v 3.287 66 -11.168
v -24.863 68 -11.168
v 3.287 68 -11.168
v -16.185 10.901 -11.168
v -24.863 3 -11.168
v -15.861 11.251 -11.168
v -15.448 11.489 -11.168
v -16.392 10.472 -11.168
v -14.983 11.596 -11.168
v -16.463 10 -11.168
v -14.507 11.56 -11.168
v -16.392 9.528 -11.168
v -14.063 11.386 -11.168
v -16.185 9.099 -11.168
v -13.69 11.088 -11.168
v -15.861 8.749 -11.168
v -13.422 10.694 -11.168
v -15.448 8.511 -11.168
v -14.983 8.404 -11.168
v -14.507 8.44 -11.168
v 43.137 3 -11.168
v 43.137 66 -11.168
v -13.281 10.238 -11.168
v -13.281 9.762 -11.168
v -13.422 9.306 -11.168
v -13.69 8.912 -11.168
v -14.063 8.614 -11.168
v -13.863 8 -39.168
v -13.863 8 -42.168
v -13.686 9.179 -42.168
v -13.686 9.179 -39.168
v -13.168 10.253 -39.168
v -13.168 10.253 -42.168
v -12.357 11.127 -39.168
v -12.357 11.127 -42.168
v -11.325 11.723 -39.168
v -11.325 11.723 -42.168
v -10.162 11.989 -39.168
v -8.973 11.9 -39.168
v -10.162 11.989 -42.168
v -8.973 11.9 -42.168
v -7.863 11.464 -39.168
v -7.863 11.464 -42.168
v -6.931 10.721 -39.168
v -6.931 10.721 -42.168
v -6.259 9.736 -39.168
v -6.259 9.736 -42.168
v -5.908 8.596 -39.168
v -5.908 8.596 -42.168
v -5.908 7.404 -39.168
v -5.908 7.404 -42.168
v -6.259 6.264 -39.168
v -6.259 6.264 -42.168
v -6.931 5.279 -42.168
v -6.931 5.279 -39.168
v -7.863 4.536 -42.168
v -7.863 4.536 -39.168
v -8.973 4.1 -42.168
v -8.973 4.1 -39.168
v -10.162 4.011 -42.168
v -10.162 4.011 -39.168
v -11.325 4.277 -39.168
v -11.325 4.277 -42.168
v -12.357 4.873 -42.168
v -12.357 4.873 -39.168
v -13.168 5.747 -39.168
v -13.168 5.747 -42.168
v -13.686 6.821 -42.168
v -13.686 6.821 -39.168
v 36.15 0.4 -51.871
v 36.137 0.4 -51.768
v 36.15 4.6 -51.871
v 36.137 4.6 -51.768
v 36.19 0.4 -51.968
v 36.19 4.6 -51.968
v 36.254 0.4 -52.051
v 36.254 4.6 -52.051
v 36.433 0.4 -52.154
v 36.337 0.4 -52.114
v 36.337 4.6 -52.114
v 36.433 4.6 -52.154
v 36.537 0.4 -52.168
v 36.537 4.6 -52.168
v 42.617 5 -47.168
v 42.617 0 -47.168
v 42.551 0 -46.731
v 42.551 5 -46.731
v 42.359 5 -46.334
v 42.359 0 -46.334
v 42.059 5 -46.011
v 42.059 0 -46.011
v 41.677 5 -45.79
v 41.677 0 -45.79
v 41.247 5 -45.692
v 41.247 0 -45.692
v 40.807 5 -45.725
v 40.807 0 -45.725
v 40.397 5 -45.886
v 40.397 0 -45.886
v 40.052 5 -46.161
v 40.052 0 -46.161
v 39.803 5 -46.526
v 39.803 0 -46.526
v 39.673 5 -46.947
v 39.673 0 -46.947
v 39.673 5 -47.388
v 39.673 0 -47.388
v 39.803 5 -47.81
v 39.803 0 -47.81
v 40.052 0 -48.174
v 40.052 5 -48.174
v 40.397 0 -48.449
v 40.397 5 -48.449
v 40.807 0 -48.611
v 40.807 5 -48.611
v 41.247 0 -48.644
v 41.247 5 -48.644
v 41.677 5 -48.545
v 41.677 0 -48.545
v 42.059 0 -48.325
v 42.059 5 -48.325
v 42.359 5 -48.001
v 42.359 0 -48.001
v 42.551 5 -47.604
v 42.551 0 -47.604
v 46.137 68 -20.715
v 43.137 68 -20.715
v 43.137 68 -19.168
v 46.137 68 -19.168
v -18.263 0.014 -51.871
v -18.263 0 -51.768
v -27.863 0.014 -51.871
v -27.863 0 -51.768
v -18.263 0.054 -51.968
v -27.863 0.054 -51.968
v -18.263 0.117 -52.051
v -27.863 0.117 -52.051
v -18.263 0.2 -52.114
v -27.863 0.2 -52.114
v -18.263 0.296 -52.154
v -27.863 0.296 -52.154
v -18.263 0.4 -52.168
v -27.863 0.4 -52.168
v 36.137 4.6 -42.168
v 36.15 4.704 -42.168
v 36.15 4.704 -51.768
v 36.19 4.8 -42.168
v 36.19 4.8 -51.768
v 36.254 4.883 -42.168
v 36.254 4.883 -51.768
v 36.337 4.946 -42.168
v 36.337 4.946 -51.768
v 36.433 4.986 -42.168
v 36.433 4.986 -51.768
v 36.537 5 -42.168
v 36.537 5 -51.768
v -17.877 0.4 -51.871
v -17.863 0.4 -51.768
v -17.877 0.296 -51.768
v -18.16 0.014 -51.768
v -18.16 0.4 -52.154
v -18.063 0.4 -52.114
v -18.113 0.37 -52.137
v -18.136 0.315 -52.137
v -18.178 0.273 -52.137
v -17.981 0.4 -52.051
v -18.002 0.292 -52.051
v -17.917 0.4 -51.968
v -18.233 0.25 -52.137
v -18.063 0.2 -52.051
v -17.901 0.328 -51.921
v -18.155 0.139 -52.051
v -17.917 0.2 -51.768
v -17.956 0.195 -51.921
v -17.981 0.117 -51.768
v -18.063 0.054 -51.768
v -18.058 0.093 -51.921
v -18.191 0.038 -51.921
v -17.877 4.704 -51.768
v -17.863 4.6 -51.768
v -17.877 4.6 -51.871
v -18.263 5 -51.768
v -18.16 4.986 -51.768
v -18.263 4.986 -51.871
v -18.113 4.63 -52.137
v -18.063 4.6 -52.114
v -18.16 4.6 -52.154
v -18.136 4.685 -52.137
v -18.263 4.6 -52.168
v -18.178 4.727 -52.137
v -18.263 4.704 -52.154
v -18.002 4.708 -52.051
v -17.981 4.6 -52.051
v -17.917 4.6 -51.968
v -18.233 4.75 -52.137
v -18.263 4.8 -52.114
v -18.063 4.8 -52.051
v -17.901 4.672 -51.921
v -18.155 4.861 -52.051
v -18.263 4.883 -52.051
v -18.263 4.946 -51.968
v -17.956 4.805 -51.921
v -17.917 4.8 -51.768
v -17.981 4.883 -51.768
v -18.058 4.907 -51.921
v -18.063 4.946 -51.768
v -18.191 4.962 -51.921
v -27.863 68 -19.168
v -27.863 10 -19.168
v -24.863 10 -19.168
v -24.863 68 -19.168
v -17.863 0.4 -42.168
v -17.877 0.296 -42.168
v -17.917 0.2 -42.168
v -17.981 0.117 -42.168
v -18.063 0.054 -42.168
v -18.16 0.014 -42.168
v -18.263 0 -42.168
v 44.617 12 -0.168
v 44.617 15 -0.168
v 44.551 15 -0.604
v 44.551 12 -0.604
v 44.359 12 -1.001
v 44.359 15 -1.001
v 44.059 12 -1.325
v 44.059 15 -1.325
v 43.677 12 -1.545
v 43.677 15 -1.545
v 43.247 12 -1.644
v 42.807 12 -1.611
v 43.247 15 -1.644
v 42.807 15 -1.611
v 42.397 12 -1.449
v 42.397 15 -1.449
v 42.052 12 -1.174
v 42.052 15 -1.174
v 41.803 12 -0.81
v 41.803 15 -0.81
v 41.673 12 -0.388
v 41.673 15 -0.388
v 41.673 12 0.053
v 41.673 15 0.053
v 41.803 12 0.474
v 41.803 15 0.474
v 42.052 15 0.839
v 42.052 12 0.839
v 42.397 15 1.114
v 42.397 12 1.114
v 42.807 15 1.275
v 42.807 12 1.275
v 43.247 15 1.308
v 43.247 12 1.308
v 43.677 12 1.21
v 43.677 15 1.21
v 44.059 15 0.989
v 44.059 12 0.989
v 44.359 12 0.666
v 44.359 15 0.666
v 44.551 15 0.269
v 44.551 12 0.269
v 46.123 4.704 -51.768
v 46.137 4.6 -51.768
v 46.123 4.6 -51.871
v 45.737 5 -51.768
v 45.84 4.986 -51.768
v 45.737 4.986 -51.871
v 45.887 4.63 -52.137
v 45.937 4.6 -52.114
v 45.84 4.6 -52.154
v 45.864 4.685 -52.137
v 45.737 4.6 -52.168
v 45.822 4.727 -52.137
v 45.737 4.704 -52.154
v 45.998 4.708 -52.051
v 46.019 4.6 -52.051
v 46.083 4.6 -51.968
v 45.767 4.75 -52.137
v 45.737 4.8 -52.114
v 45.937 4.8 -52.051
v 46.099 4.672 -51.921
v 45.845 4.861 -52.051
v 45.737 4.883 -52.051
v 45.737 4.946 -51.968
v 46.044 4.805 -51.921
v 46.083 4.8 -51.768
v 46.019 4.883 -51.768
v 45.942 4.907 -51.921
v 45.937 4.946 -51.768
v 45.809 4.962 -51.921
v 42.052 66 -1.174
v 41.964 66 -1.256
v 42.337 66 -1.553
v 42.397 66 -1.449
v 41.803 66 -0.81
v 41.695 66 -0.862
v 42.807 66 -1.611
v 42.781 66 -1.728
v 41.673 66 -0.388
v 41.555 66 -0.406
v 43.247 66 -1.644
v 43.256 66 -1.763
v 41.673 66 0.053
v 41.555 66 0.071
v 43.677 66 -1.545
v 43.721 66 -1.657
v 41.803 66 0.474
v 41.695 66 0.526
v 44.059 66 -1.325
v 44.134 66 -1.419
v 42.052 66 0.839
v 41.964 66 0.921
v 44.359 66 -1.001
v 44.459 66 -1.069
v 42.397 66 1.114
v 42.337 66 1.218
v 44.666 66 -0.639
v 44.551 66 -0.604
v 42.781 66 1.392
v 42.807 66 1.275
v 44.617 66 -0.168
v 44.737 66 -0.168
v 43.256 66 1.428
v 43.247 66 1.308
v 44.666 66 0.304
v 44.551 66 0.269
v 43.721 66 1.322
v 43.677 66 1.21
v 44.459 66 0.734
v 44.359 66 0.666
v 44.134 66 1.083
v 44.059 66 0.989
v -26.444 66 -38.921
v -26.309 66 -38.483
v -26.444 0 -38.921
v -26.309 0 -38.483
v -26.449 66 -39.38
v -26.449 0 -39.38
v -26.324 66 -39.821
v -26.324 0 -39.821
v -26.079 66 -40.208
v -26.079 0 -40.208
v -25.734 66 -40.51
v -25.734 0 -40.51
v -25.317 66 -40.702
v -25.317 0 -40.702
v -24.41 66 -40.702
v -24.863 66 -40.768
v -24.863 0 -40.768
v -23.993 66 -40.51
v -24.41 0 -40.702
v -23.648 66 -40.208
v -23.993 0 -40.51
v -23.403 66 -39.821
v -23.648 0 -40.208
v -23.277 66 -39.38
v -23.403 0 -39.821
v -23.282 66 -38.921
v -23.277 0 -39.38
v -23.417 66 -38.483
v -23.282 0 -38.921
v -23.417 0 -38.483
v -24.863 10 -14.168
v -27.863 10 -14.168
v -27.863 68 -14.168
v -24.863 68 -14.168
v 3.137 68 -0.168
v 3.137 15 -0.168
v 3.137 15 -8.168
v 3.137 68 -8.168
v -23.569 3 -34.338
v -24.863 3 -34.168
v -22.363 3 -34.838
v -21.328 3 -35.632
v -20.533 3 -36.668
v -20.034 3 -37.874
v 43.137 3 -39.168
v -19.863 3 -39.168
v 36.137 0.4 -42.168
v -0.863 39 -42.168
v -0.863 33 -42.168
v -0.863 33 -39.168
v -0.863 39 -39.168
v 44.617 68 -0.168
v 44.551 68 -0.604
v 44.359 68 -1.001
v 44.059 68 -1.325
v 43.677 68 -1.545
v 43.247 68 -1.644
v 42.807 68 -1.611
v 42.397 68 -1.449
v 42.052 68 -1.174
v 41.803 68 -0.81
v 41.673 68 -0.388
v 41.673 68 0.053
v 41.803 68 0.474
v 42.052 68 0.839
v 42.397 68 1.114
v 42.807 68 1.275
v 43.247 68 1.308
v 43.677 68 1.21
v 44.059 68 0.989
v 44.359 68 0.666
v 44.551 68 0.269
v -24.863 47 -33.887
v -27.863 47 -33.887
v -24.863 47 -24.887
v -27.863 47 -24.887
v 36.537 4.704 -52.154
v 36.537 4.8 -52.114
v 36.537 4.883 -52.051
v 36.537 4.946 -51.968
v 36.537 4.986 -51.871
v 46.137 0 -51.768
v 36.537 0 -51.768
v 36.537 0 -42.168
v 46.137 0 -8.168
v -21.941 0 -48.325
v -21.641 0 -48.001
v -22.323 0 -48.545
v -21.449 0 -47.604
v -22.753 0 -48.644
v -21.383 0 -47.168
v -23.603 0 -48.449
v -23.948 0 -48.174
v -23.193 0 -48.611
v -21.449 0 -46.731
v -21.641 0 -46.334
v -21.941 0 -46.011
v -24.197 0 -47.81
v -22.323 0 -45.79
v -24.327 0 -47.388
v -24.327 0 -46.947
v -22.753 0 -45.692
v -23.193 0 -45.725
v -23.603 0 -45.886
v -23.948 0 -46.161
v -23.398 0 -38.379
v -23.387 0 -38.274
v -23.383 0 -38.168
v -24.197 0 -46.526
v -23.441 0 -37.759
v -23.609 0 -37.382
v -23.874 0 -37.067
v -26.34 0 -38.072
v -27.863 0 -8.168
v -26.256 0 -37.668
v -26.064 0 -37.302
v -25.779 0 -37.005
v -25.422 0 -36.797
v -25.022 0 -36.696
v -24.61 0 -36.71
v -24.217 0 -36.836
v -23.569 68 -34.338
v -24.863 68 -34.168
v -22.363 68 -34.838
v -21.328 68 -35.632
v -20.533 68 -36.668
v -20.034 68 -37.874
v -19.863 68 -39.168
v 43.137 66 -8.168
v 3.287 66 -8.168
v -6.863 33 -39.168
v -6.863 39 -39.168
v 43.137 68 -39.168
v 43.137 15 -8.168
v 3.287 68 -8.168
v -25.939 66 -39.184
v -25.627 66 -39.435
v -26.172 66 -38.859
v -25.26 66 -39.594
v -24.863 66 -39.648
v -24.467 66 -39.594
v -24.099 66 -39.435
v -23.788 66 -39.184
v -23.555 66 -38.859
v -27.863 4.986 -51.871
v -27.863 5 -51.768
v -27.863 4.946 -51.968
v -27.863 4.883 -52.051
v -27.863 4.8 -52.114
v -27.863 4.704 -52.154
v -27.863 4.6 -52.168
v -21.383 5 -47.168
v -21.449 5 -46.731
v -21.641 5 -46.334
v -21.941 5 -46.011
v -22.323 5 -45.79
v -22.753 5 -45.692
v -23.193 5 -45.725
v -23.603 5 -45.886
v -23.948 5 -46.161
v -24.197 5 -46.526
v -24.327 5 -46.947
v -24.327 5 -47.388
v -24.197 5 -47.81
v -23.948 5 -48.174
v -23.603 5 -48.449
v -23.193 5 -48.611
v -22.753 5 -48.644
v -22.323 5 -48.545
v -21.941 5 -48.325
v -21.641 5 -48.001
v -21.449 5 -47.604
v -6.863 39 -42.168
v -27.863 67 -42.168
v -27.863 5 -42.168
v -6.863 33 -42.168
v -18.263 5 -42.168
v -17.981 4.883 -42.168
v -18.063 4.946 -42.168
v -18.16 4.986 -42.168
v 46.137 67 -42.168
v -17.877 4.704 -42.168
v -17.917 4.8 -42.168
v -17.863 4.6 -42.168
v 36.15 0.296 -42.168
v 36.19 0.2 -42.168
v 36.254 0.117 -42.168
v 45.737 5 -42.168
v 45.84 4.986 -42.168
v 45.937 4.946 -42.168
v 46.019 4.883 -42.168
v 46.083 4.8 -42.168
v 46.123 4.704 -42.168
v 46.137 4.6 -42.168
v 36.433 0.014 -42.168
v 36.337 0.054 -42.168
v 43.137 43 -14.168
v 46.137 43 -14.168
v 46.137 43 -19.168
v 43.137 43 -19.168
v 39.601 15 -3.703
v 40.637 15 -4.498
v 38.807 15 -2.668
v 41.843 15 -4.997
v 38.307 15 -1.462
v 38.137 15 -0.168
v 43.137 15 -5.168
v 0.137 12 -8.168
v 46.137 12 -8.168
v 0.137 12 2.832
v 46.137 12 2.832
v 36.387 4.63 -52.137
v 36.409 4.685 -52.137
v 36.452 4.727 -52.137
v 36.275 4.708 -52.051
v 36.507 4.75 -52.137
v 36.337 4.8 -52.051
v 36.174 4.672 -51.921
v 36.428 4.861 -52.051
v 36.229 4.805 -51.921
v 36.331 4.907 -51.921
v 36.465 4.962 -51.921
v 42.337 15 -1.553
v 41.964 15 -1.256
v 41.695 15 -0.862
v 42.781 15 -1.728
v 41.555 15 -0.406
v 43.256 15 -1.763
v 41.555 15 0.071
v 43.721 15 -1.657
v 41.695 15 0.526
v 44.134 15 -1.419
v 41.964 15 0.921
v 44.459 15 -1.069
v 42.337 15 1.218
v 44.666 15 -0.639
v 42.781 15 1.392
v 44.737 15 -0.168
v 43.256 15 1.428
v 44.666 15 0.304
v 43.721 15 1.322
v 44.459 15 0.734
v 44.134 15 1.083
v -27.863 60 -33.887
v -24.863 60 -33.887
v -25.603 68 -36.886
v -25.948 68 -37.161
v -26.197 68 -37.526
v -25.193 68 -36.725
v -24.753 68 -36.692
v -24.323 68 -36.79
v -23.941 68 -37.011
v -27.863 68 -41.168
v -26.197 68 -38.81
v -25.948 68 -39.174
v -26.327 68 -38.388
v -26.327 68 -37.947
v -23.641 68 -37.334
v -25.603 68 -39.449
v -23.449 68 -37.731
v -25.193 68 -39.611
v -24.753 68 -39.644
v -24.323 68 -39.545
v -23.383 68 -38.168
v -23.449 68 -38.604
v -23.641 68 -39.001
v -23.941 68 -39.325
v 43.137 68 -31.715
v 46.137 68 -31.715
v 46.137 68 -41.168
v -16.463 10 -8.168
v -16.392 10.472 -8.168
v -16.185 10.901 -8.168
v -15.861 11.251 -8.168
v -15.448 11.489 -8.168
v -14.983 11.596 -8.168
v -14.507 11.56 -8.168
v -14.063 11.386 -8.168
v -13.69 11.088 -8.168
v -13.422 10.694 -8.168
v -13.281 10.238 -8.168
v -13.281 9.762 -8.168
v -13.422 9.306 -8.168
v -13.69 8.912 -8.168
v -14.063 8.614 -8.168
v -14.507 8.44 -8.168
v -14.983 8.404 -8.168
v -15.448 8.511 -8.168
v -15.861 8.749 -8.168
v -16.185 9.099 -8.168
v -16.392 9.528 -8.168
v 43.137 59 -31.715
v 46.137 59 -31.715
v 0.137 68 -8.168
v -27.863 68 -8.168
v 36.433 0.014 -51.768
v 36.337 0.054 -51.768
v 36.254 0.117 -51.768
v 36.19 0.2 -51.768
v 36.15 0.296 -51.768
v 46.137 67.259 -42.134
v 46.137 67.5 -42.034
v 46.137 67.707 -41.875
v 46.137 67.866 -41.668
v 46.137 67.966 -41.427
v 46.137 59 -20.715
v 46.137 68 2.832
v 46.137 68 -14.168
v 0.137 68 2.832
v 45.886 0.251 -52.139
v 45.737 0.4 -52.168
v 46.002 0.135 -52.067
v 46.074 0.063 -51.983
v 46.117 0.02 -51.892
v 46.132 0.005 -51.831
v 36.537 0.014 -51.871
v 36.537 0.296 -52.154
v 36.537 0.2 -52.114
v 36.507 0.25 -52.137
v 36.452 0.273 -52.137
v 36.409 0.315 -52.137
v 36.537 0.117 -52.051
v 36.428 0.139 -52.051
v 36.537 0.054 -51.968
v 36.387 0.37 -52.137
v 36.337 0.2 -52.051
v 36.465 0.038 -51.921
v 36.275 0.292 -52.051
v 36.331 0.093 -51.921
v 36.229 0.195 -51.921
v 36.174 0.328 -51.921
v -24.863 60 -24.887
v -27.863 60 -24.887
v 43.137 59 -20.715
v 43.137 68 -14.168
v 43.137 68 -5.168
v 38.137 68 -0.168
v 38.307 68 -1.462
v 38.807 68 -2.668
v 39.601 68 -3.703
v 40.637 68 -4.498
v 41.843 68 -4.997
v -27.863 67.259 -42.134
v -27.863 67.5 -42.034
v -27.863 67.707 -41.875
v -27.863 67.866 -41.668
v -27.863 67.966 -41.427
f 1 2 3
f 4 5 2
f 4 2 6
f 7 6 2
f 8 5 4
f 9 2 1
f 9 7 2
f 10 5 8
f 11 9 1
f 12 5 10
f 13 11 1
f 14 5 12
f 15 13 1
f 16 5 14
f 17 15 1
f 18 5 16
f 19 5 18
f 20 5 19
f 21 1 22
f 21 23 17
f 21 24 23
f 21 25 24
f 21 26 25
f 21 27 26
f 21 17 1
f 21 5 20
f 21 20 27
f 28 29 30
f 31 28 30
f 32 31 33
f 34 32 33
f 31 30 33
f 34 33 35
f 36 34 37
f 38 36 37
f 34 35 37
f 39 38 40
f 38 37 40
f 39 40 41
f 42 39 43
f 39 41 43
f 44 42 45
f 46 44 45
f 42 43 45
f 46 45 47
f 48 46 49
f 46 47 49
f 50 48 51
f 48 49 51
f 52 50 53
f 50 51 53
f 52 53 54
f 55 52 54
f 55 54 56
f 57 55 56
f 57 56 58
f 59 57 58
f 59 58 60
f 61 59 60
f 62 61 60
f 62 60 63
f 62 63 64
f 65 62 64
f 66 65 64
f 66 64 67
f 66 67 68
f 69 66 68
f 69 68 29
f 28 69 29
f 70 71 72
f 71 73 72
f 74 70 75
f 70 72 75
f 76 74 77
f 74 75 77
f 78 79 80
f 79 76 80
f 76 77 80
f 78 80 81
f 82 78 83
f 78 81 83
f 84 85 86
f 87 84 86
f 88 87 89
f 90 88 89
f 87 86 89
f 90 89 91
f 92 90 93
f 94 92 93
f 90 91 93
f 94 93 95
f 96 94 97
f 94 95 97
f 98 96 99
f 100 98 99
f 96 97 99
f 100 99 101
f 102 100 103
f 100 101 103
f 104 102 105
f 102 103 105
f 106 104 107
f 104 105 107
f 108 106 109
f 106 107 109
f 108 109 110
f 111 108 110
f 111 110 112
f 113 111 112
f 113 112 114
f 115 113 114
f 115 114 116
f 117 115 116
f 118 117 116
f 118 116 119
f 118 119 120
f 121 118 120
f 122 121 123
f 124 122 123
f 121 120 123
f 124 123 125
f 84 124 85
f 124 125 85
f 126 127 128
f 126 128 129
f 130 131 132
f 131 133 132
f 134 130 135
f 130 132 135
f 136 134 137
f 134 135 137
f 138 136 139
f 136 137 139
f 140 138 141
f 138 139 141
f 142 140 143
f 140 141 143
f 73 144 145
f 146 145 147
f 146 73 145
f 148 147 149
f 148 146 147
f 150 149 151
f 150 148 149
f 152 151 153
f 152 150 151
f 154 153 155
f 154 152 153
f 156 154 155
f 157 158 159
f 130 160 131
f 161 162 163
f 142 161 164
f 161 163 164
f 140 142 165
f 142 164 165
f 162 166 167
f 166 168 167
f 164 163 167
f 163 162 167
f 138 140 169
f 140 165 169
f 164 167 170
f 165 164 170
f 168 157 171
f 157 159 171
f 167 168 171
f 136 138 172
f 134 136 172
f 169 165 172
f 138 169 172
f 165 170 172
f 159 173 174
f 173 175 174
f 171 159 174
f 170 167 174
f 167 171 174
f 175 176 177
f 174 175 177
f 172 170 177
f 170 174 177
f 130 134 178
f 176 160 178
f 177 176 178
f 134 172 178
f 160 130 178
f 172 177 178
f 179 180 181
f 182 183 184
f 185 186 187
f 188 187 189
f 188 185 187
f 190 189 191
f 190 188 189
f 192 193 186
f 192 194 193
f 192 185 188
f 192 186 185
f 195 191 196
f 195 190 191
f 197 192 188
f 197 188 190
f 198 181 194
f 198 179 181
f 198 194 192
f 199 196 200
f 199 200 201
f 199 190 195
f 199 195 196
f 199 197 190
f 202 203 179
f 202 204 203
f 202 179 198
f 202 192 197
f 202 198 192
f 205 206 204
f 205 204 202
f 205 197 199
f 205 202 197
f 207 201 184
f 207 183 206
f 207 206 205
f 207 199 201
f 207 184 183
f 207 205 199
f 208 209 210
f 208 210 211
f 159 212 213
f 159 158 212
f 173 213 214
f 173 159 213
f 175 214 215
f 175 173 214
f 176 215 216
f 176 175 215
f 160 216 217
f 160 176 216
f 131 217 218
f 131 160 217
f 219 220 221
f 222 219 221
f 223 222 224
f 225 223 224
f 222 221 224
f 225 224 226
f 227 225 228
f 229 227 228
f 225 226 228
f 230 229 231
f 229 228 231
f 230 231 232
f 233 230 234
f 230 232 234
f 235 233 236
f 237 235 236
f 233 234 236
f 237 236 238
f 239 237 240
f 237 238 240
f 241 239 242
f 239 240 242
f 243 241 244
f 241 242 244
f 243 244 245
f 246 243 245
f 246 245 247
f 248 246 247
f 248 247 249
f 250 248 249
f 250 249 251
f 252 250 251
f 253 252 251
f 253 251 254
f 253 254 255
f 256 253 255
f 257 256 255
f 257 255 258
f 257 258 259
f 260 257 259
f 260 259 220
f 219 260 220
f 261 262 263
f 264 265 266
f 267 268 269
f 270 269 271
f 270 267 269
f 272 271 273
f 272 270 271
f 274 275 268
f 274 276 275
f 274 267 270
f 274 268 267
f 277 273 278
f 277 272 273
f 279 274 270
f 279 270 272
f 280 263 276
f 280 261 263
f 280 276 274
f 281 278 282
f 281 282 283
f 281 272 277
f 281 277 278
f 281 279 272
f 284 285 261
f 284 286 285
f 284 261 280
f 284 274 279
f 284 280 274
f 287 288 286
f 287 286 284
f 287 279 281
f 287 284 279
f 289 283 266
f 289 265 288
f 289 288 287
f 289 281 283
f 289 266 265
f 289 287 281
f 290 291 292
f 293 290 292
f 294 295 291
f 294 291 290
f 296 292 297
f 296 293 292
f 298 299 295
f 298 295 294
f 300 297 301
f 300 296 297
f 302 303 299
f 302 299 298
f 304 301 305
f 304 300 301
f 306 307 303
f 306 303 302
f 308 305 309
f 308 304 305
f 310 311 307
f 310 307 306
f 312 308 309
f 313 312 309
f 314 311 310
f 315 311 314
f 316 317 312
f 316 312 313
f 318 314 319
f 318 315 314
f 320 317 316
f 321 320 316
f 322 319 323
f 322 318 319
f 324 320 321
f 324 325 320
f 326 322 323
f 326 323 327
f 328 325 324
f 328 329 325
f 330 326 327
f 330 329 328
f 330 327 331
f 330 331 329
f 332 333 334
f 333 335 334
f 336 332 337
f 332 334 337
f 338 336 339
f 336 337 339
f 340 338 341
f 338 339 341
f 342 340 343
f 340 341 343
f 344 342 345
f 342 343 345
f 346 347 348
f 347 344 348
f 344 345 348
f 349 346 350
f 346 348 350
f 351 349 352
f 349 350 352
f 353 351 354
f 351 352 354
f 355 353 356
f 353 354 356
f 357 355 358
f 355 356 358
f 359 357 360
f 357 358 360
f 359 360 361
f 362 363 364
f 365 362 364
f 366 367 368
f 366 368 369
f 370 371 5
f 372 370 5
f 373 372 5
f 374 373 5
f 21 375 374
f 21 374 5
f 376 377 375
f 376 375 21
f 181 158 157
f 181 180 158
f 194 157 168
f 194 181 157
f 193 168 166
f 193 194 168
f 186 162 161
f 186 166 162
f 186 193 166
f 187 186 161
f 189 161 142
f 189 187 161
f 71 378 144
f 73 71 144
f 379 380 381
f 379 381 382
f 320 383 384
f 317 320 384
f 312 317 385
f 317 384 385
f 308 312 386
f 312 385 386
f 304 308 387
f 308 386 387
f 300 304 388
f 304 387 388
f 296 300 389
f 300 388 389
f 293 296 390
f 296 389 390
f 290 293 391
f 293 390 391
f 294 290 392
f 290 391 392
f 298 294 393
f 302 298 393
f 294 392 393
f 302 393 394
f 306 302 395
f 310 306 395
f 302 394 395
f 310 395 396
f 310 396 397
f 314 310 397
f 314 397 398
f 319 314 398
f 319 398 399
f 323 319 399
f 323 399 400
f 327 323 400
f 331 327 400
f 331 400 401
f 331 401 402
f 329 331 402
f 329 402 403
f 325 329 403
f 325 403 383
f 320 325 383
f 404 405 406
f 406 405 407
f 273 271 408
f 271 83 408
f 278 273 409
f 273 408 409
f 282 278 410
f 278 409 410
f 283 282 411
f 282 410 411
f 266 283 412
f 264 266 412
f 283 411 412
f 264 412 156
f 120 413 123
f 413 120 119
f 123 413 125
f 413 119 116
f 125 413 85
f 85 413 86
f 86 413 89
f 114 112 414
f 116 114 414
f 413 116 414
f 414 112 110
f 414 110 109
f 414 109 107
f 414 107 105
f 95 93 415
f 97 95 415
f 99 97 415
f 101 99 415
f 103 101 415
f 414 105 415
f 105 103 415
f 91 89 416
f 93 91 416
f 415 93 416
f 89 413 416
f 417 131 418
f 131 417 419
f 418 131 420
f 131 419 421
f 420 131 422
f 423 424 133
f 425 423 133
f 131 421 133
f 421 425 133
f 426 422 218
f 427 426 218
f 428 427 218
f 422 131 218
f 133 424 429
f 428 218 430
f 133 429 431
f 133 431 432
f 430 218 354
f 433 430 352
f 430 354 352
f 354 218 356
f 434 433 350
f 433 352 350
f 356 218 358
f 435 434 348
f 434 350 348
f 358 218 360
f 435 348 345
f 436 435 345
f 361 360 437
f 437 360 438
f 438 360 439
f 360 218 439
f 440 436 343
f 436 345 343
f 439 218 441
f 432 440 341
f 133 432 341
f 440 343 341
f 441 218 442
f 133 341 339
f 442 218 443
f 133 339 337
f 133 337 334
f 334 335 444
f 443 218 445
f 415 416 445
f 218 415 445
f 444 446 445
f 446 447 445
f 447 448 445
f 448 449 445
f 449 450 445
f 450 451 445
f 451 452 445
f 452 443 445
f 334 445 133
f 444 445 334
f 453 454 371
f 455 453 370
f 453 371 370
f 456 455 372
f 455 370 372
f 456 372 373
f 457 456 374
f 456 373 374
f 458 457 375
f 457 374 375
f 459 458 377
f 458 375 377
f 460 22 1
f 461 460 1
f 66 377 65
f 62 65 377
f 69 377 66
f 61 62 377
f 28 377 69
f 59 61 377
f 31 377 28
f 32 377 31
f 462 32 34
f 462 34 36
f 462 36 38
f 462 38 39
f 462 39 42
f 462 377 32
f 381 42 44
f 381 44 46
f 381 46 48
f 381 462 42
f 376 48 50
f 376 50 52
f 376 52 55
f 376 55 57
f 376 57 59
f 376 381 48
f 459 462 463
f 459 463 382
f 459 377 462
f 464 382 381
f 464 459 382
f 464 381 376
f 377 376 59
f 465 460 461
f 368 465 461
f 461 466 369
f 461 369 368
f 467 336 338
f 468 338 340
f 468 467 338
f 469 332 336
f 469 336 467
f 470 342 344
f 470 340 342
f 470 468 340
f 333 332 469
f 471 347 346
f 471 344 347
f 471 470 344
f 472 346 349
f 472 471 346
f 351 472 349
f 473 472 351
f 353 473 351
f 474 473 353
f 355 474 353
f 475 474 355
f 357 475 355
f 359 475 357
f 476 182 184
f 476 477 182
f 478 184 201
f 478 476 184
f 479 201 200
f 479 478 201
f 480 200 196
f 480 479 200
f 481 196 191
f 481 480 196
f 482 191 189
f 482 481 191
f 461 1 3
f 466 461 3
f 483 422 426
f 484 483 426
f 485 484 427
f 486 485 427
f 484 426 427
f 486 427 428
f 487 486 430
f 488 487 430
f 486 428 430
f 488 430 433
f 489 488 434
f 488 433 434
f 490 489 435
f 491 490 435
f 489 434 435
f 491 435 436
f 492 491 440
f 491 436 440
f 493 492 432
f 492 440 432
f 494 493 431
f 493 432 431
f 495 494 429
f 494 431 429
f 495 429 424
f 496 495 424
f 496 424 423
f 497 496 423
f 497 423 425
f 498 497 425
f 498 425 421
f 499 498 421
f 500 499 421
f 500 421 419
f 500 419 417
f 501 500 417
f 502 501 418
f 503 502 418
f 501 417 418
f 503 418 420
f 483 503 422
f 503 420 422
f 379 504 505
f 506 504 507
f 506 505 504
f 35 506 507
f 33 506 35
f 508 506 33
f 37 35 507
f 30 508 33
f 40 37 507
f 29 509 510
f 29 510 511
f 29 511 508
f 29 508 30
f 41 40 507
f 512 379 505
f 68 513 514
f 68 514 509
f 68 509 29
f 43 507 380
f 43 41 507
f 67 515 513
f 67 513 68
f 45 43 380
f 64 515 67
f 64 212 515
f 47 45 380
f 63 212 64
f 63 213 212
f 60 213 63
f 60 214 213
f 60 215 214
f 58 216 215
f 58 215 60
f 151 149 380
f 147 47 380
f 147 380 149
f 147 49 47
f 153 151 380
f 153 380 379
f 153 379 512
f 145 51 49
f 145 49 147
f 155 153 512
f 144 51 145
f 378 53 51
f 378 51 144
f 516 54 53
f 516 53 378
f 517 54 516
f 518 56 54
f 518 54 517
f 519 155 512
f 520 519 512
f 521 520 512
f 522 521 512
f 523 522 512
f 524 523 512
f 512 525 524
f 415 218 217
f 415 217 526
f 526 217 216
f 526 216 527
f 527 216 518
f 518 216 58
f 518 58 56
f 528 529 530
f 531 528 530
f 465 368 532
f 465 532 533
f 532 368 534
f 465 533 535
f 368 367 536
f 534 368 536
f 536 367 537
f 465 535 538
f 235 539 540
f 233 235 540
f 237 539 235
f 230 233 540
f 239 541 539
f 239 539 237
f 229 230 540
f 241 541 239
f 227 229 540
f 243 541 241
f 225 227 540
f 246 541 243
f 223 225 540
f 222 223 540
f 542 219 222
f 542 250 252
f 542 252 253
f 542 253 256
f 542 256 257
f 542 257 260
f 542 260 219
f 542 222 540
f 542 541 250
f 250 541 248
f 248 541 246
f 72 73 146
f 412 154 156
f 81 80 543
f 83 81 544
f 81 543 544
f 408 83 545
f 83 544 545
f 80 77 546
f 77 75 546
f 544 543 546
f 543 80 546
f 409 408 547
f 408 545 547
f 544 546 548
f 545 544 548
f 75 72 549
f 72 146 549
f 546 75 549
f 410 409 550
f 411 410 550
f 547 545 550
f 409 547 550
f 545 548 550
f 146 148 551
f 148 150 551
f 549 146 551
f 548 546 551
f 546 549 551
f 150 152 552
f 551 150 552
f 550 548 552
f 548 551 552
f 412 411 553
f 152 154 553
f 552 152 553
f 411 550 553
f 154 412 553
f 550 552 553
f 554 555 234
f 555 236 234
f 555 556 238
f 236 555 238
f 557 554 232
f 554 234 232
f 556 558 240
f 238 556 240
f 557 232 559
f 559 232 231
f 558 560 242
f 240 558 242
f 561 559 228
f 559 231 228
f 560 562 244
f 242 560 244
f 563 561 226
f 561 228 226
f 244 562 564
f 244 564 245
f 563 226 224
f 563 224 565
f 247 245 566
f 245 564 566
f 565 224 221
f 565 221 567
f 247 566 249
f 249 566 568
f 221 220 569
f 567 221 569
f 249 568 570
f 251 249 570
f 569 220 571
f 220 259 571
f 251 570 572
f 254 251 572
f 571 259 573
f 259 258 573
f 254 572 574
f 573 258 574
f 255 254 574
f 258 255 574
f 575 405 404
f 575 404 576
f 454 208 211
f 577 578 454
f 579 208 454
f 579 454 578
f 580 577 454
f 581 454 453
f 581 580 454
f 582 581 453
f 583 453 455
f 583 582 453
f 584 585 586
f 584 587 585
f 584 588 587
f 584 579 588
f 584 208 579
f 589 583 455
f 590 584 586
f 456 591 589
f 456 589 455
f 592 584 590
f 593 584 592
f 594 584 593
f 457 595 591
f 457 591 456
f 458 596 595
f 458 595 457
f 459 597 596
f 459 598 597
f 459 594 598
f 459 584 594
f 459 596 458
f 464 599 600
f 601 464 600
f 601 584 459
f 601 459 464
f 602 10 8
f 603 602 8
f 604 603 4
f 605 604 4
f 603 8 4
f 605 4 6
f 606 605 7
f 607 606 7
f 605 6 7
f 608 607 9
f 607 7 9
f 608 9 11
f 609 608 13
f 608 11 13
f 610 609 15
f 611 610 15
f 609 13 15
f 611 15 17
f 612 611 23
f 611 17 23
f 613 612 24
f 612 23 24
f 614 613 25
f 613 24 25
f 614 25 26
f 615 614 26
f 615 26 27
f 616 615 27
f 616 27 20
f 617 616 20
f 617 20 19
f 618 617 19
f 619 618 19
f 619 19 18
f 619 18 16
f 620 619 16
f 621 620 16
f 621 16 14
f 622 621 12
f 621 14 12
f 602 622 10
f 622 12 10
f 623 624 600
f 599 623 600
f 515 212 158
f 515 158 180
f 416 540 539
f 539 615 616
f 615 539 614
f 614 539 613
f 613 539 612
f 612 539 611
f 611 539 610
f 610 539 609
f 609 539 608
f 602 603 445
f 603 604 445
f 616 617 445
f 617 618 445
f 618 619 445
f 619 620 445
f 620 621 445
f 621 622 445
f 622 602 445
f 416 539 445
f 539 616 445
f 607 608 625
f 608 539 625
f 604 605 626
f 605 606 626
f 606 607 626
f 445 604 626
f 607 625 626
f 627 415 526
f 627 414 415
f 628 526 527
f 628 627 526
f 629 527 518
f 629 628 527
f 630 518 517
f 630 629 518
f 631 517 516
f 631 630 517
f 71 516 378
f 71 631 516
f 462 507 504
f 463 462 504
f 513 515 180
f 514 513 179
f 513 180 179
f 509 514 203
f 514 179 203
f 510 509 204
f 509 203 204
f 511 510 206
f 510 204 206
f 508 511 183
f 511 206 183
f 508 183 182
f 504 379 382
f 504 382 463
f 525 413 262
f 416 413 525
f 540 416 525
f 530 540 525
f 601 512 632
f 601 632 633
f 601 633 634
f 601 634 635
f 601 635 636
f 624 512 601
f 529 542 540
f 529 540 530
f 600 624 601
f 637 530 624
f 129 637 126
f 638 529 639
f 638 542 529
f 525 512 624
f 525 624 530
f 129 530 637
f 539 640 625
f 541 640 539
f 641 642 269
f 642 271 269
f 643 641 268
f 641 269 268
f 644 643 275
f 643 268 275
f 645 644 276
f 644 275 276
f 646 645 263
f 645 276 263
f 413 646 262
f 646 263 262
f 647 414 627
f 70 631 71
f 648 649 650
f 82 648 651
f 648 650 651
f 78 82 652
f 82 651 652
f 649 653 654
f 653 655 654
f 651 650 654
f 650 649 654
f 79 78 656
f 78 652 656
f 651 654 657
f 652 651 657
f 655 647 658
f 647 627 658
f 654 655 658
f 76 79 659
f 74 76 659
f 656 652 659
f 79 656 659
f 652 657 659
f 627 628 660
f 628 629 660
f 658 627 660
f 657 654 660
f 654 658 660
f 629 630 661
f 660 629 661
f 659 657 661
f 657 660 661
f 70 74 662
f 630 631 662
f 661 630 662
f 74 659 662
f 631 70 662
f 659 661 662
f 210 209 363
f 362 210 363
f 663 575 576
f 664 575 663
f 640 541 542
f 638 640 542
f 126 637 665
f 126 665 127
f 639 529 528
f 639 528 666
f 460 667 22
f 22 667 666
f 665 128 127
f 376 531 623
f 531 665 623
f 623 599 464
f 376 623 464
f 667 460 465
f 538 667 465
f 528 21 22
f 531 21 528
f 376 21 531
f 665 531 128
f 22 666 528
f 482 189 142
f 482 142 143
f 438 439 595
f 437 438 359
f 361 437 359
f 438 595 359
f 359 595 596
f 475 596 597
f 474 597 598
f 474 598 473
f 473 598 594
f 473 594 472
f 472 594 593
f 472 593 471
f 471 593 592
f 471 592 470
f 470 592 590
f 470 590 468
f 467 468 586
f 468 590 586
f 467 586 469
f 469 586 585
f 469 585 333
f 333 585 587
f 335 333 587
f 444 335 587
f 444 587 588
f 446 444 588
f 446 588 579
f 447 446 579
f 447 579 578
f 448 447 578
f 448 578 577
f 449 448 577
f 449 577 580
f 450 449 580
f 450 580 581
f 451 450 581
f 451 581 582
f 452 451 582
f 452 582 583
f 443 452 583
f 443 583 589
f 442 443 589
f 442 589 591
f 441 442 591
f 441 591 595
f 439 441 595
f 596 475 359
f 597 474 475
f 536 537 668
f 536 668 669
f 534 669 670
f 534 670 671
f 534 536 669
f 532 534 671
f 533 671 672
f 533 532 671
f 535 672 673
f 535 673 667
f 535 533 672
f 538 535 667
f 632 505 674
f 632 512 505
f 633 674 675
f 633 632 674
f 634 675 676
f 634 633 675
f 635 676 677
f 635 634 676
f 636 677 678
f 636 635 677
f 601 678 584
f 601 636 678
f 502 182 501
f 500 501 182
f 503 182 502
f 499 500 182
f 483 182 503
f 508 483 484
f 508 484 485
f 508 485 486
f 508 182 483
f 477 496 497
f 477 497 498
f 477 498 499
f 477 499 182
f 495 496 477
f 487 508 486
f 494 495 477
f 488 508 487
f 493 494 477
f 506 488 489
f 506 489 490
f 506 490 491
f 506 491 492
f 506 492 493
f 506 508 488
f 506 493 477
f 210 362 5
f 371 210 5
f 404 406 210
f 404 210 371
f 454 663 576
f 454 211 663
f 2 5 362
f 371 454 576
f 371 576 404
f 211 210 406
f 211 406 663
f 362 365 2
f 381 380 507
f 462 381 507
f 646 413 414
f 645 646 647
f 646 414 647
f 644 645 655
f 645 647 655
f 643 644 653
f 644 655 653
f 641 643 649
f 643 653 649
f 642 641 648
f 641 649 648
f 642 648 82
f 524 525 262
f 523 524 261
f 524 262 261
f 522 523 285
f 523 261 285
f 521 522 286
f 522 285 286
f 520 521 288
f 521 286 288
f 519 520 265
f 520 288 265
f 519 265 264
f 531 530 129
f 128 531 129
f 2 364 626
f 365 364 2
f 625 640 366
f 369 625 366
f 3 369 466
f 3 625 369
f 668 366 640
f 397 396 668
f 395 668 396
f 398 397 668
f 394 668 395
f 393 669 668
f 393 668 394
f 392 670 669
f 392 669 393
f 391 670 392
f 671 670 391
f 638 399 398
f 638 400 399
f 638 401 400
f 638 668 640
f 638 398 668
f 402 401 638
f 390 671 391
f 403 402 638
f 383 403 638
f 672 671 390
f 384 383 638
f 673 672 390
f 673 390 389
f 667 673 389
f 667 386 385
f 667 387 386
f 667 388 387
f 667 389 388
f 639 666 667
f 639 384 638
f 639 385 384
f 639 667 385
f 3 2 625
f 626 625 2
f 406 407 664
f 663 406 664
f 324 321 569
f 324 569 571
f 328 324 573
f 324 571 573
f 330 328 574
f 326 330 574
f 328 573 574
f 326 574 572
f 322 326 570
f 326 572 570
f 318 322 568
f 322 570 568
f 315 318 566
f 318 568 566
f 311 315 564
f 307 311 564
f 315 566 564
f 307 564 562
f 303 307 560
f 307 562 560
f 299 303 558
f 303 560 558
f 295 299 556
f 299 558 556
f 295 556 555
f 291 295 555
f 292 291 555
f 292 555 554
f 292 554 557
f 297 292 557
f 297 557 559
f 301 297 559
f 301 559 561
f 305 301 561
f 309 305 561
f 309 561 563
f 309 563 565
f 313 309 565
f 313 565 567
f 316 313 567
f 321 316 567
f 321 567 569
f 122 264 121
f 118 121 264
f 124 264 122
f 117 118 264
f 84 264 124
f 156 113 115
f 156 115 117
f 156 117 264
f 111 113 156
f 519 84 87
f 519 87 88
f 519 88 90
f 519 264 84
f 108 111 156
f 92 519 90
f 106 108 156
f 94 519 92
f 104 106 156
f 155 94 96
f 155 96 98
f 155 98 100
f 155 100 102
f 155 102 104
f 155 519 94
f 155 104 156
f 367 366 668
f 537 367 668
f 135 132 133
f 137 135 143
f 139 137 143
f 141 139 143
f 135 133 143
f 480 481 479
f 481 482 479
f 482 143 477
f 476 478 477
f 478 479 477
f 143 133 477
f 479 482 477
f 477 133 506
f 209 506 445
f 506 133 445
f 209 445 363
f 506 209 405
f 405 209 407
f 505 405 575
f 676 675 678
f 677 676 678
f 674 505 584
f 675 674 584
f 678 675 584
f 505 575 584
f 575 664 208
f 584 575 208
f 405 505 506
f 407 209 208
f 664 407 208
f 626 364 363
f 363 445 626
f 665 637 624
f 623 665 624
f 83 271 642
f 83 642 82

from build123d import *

# Parameters (mm, degrees)
SKETCH1_W            = 74
SKETCH1_H            = 45
BOSS_EXTRUDE1_DEPTH  = 68
SKETCH3_W            = 68
SKETCH3_H            = 39
CUT_EXTRUDE2_DEPTH   = 65
SKETCH13_W           = 68
SKETCH13_H           = 3
BOSS_EXTRUDE3_DEPTH  = 65
SKETCH14_W           = 5
SKETCH14_H           = 58
CUT_EXTRUDE5_DEPTH   = 23
SKETCH15_W           = 5
SKETCH15_H           = 25
CUT_EXTRUDE6_DEPTH   = 3
SKETCH18_R           = 1.6
CUT_EXTRUDE8_DEPTH   = 3
SKETCH20_R           = 4
CUT_EXTRUDE9_DEPTH   = 18
BOSS_EXTRUDE4_DEPTH  = 68
SKETCH23_R           = 1.6
CUT_EXTRUDE10_DEPTH  = 66
BOSS_EXTRUDE5_DEPTH  = 68
SKETCH25_R           = 1.6
CUT_EXTRUDE11_DEPTH  = 66
FILLET2_R            = 1
SKETCH30_W           = 10
SKETCH30_H           = 5
BOSS_EXTRUDE6_DEPTH  = 10
SKETCH33_R           = 1.48
CUT_EXTRUDE13_DEPTH  = 5
SKETCH34_W           = 10
SKETCH34_H           = 5
BOSS_EXTRUDE8_DEPTH  = 10
SKETCH35_R           = 1.48
CUT_EXTRUDE14_DEPTH  = 5
FILLET10_R           = 0.4
CUT_EXTRUDE17_DEPTH  = 11
SKETCH45_W           = 3
SKETCH45_H           = 56
BOSS_EXTRUDE9_DEPTH  = 11
SKETCH47_W           = 46
SKETCH47_H           = 3
BOSS_EXTRUDE10_DEPTH = 11
SKETCH49_R           = 1.48
CUT_EXTRUDE18_DEPTH  = 56
SKETCH50_R           = 1.48
CUT_EXTRUDE19_DEPTH  = 68
SKETCH52_W           = 39.849234896
SKETCH52_H           = 2
CUT_EXTRUDE20_DEPTH  = 3
SKETCH54_W           = 11
SKETCH54_H           = 9
CUT_EXTRUDE21_DEPTH  = 3
SKETCH56_W           = 9
SKETCH56_H           = 13
CUT_EXTRUDE22_DEPTH  = 3
SKETCH57_W           = 6
SKETCH57_H           = 6
CUT_EXTRUDE23_DEPTH  = 3


with BuildPart() as part:
    # Sketch1 → Boss-Extrude1 (new body)
    with BuildSketch(Plane(origin=(-3.580186039, 0, -14.417736579), x_dir=(1, 0, 0), z_dir=(0, 1, 0))):
        with Locations((12.716824493, 5.25)):
            Rectangle(SKETCH1_W, SKETCH1_H)
    extrude(amount=BOSS_EXTRUDE1_DEPTH)

    # Sketch3 → Cut-Extrude2 (cut)
    with BuildSketch(Plane(origin=(-3.580186039, 68, -14.417736579), x_dir=(1, 0, 0), z_dir=(0, 1, 0))):
        with Locations((12.716824493, 5.25)):
            Rectangle(SKETCH3_W, SKETCH3_H)
    extrude(amount=-CUT_EXTRUDE2_DEPTH, mode=Mode.SUBTRACT)

    # Sketch13 → Boss-Extrude3 (add)
    with BuildSketch(Plane(origin=(-3.580186039, 3, -14.417736579), x_dir=(1, 0, 0), z_dir=(0, 1, 0))):
        with Locations((12.716824493, -4.75)):
            Rectangle(SKETCH13_W, SKETCH13_H)
    extrude(amount=BOSS_EXTRUDE3_DEPTH)

    # Sketch14 → Cut-Extrude5 (cut)
    with BuildSketch(Plane(origin=(-27.863361546, 0, -14.417736579), x_dir=(0, 0, 1), z_dir=(-1, 0, 0))):
        with Locations((-2.25, 39)):
            Rectangle(SKETCH14_W, SKETCH14_H)
    extrude(amount=-CUT_EXTRUDE5_DEPTH, mode=Mode.SUBTRACT)

    # Sketch15 → Cut-Extrude6 (cut)
    with BuildSketch(Plane(origin=(46.136638454, 0, -14.417736579), x_dir=(0, 0, -1), z_dir=(1, 0, 0))):
        with Locations((2.25, 55.5)):
            Rectangle(SKETCH15_W, SKETCH15_H)
    extrude(amount=-CUT_EXTRUDE6_DEPTH, mode=Mode.SUBTRACT)

    # Sketch18 → Cut-Extrude8 (cut)
    with BuildSketch(Plane(origin=(-3.580186039, 0, -11.167736579), x_dir=(-1, 0, 0), z_dir=(0, 0, -1))):
        with Locations((11.283175507, 10)):
            Circle(SKETCH18_R)
    extrude(amount=-CUT_EXTRUDE8_DEPTH, mode=Mode.SUBTRACT)

    # Sketch20 → Cut-Extrude9 (cut)
    with BuildSketch(Plane(origin=(0, 0, -42.167736579), x_dir=(-1, 0, 0), z_dir=(0, 0, -1))):
        with Locations((9.863361546, 8)):
            Circle(SKETCH20_R)
    extrude(amount=-CUT_EXTRUDE9_DEPTH, mode=Mode.SUBTRACT)

    # Sketch21 → Boss-Extrude4 (add)
    with BuildSketch(Plane.XZ):
        with BuildLine():
            Line((46.136638454, -4.167736579), (46.136638454, 2.832263421))
            Line((46.136638454, 2.832263421), (39.136638454, 2.832263421))
            ThreePointArc((39.136638454, 2.832263421), (39.601104548, -3.703270485), (46.136638454, -4.167736579))
        make_face()
    extrude(amount=-BOSS_EXTRUDE4_DEPTH)

    # Sketch23 → Cut-Extrude10 (cut)
    with BuildSketch(Plane.XZ):
        with Locations((43.136638454, -0.167736579)):
            Circle(SKETCH23_R)
    extrude(amount=-CUT_EXTRUDE10_DEPTH, mode=Mode.SUBTRACT)

    # Sketch24 → Boss-Extrude5 (add)
    with BuildSketch(Plane.XZ):
        with BuildLine():
            Line((-20.863361546, -42.167736579), (-27.863361546, -42.167736579))
            Line((-27.863361546, -42.167736579), (-27.863361546, -35.167736579))
            ThreePointArc((-27.863361546, -35.167736579), (-21.327827641, -35.632202673), (-20.863361546, -42.167736579))
        make_face()
    extrude(amount=-BOSS_EXTRUDE5_DEPTH)

    # Sketch25 → Cut-Extrude11 (cut)
    with BuildSketch(Plane.XZ):
        with Locations((-24.863361546, -39.167736579)):
            Circle(SKETCH25_R)
    extrude(amount=-CUT_EXTRUDE11_DEPTH, mode=Mode.SUBTRACT)

    # Fillet2
    fillet2_edges = [part.edges().sort_by_distance(p)[0] for p in [
        (9.136638454, 68, -42.167736579),
    ]]
    fillet(fillet2_edges, radius=FILLET2_R)

    # Sketch30 → Boss-Extrude6 (add)
    with BuildSketch(Plane(origin=(0, 0, -42.167736579), x_dir=(-1, 0, 0), z_dir=(0, 0, -1))):
        with Locations((-41.136638454, 2.5)):
            Rectangle(SKETCH30_W, SKETCH30_H)
    extrude(amount=BOSS_EXTRUDE6_DEPTH)

    # Sketch33 → Cut-Extrude13 (cut)
    with BuildSketch(Plane.XZ):
        with Locations((41.136638454, -47.167736579)):
            Circle(SKETCH33_R)
    extrude(amount=-CUT_EXTRUDE13_DEPTH, mode=Mode.SUBTRACT)

    # Sketch34 → Boss-Extrude8 (add)
    with BuildSketch(Plane(origin=(0, 0, -42.167736579), x_dir=(-1, 0, 0), z_dir=(0, 0, -1))):
        with Locations((22.863361546, 2.5)):
            Rectangle(SKETCH34_W, SKETCH34_H)
    extrude(amount=BOSS_EXTRUDE8_DEPTH)

    # Sketch35 → Cut-Extrude14 (cut)
    with BuildSketch(Plane.XZ):
        with Locations((-22.863361546, -47.167736579)):
            Circle(SKETCH35_R)
    extrude(amount=-CUT_EXTRUDE14_DEPTH, mode=Mode.SUBTRACT)

    # Fillet10
    fillet10_edges = [part.edges().sort_by_distance(p)[0] for p in [
        (46.136638454, 5, -47.167736579),
        (36.136638454, 0, -47.167736579),
        (36.136638454, 5, -47.167736579),
        (46.136638454, 2.5, -52.167736579),
        (41.136638454, 0, -52.167736579),
        (36.136638454, 2.5, -52.167736579),
        (41.136638454, 5, -52.167736579),
        (-17.863361546, 5, -47.167736579),
        (-17.863361546, 0, -47.167736579),
        (-17.863361546, 2.5, -52.167736579),
        (-22.863361546, 0, -52.167736579),
        (-22.863361546, 5, -52.167736579),
    ]]
    fillet(fillet10_edges, radius=FILLET10_R)

    # Sketch43 → Cut-Extrude17 (cut)
    with BuildSketch(Plane.XY.offset(2.832263421)):
        Polygon((-27.863361546, 68), (0.136638454, 68), (0.136638454, 12), (46.136638454, 12), (46.136638454, 0), (-27.863361546, 0), (-27.863361546, 12), align=None)
    extrude(amount=-CUT_EXTRUDE17_DEPTH, mode=Mode.SUBTRACT)

    # Sketch45 → Boss-Extrude9 (add)
    with BuildSketch(Plane.XY.offset(2.832263421)):
        with Locations((1.636638454, 40)):
            Rectangle(SKETCH45_W, SKETCH45_H)
    extrude(amount=-BOSS_EXTRUDE9_DEPTH)

    # Sketch47 → Boss-Extrude10 (add)
    with BuildSketch(Plane.XY.offset(2.832263421)):
        with Locations((23.136638454, 13.5)):
            Rectangle(SKETCH47_W, SKETCH47_H)
    extrude(amount=-BOSS_EXTRUDE10_DEPTH)

    # Sketch49 → Cut-Extrude18 (cut)
    with BuildSketch(Plane(origin=(0, 68, 0), x_dir=(1, 0, 0), z_dir=(0, 1, 0))):
        with Locations((43.136638454, 0.167736579)):
            Circle(SKETCH49_R)
    extrude(amount=-CUT_EXTRUDE18_DEPTH, mode=Mode.SUBTRACT)

    # Sketch50 → Cut-Extrude19 (cut)
    with BuildSketch(Plane(origin=(0, 68, 0), x_dir=(1, 0, 0), z_dir=(0, 1, 0))):
        with Locations((-24.863361546, 38.167736579)):
            Circle(SKETCH50_R)
    extrude(amount=-CUT_EXTRUDE19_DEPTH, mode=Mode.SUBTRACT)

    # Sketch52 → Cut-Extrude20 (cut)
    with BuildSketch(Plane(origin=(0, 0, -11.167736579), x_dir=(-1, 0, 0), z_dir=(0, 0, -1))):
        with Locations((-23.212021006, 67)):
            Rectangle(SKETCH52_W, SKETCH52_H)
    extrude(amount=-CUT_EXTRUDE20_DEPTH, mode=Mode.SUBTRACT)

    # Sketch54 → Cut-Extrude21 (cut)
    with BuildSketch(Plane(origin=(46.136638454, 0, 0), x_dir=(0, 0, -1), z_dir=(1, 0, 0))):
        with Locations((26.2154696, 63.5)):
            Rectangle(SKETCH54_W, SKETCH54_H)
    extrude(amount=-CUT_EXTRUDE21_DEPTH, mode=Mode.SUBTRACT)

    # Sketch56 → Cut-Extrude22 (cut)
    with BuildSketch(Plane.ZY.offset(27.863361546)):
        with Locations((-29.387336529, 53.5)):
            Rectangle(SKETCH56_W, SKETCH56_H)
    extrude(amount=-CUT_EXTRUDE22_DEPTH, mode=Mode.SUBTRACT)

    # Sketch57 → Cut-Extrude23 (cut)
    with BuildSketch(Plane(origin=(0, 0, -42.167736579), x_dir=(-1, 0, 0), z_dir=(0, 0, -1))):
        with Locations((3.863361546, 36)):
            Rectangle(SKETCH57_W, SKETCH57_H)
    extrude(amount=-CUT_EXTRUDE23_DEPTH, mode=Mode.SUBTRACT)


solid = part.part
